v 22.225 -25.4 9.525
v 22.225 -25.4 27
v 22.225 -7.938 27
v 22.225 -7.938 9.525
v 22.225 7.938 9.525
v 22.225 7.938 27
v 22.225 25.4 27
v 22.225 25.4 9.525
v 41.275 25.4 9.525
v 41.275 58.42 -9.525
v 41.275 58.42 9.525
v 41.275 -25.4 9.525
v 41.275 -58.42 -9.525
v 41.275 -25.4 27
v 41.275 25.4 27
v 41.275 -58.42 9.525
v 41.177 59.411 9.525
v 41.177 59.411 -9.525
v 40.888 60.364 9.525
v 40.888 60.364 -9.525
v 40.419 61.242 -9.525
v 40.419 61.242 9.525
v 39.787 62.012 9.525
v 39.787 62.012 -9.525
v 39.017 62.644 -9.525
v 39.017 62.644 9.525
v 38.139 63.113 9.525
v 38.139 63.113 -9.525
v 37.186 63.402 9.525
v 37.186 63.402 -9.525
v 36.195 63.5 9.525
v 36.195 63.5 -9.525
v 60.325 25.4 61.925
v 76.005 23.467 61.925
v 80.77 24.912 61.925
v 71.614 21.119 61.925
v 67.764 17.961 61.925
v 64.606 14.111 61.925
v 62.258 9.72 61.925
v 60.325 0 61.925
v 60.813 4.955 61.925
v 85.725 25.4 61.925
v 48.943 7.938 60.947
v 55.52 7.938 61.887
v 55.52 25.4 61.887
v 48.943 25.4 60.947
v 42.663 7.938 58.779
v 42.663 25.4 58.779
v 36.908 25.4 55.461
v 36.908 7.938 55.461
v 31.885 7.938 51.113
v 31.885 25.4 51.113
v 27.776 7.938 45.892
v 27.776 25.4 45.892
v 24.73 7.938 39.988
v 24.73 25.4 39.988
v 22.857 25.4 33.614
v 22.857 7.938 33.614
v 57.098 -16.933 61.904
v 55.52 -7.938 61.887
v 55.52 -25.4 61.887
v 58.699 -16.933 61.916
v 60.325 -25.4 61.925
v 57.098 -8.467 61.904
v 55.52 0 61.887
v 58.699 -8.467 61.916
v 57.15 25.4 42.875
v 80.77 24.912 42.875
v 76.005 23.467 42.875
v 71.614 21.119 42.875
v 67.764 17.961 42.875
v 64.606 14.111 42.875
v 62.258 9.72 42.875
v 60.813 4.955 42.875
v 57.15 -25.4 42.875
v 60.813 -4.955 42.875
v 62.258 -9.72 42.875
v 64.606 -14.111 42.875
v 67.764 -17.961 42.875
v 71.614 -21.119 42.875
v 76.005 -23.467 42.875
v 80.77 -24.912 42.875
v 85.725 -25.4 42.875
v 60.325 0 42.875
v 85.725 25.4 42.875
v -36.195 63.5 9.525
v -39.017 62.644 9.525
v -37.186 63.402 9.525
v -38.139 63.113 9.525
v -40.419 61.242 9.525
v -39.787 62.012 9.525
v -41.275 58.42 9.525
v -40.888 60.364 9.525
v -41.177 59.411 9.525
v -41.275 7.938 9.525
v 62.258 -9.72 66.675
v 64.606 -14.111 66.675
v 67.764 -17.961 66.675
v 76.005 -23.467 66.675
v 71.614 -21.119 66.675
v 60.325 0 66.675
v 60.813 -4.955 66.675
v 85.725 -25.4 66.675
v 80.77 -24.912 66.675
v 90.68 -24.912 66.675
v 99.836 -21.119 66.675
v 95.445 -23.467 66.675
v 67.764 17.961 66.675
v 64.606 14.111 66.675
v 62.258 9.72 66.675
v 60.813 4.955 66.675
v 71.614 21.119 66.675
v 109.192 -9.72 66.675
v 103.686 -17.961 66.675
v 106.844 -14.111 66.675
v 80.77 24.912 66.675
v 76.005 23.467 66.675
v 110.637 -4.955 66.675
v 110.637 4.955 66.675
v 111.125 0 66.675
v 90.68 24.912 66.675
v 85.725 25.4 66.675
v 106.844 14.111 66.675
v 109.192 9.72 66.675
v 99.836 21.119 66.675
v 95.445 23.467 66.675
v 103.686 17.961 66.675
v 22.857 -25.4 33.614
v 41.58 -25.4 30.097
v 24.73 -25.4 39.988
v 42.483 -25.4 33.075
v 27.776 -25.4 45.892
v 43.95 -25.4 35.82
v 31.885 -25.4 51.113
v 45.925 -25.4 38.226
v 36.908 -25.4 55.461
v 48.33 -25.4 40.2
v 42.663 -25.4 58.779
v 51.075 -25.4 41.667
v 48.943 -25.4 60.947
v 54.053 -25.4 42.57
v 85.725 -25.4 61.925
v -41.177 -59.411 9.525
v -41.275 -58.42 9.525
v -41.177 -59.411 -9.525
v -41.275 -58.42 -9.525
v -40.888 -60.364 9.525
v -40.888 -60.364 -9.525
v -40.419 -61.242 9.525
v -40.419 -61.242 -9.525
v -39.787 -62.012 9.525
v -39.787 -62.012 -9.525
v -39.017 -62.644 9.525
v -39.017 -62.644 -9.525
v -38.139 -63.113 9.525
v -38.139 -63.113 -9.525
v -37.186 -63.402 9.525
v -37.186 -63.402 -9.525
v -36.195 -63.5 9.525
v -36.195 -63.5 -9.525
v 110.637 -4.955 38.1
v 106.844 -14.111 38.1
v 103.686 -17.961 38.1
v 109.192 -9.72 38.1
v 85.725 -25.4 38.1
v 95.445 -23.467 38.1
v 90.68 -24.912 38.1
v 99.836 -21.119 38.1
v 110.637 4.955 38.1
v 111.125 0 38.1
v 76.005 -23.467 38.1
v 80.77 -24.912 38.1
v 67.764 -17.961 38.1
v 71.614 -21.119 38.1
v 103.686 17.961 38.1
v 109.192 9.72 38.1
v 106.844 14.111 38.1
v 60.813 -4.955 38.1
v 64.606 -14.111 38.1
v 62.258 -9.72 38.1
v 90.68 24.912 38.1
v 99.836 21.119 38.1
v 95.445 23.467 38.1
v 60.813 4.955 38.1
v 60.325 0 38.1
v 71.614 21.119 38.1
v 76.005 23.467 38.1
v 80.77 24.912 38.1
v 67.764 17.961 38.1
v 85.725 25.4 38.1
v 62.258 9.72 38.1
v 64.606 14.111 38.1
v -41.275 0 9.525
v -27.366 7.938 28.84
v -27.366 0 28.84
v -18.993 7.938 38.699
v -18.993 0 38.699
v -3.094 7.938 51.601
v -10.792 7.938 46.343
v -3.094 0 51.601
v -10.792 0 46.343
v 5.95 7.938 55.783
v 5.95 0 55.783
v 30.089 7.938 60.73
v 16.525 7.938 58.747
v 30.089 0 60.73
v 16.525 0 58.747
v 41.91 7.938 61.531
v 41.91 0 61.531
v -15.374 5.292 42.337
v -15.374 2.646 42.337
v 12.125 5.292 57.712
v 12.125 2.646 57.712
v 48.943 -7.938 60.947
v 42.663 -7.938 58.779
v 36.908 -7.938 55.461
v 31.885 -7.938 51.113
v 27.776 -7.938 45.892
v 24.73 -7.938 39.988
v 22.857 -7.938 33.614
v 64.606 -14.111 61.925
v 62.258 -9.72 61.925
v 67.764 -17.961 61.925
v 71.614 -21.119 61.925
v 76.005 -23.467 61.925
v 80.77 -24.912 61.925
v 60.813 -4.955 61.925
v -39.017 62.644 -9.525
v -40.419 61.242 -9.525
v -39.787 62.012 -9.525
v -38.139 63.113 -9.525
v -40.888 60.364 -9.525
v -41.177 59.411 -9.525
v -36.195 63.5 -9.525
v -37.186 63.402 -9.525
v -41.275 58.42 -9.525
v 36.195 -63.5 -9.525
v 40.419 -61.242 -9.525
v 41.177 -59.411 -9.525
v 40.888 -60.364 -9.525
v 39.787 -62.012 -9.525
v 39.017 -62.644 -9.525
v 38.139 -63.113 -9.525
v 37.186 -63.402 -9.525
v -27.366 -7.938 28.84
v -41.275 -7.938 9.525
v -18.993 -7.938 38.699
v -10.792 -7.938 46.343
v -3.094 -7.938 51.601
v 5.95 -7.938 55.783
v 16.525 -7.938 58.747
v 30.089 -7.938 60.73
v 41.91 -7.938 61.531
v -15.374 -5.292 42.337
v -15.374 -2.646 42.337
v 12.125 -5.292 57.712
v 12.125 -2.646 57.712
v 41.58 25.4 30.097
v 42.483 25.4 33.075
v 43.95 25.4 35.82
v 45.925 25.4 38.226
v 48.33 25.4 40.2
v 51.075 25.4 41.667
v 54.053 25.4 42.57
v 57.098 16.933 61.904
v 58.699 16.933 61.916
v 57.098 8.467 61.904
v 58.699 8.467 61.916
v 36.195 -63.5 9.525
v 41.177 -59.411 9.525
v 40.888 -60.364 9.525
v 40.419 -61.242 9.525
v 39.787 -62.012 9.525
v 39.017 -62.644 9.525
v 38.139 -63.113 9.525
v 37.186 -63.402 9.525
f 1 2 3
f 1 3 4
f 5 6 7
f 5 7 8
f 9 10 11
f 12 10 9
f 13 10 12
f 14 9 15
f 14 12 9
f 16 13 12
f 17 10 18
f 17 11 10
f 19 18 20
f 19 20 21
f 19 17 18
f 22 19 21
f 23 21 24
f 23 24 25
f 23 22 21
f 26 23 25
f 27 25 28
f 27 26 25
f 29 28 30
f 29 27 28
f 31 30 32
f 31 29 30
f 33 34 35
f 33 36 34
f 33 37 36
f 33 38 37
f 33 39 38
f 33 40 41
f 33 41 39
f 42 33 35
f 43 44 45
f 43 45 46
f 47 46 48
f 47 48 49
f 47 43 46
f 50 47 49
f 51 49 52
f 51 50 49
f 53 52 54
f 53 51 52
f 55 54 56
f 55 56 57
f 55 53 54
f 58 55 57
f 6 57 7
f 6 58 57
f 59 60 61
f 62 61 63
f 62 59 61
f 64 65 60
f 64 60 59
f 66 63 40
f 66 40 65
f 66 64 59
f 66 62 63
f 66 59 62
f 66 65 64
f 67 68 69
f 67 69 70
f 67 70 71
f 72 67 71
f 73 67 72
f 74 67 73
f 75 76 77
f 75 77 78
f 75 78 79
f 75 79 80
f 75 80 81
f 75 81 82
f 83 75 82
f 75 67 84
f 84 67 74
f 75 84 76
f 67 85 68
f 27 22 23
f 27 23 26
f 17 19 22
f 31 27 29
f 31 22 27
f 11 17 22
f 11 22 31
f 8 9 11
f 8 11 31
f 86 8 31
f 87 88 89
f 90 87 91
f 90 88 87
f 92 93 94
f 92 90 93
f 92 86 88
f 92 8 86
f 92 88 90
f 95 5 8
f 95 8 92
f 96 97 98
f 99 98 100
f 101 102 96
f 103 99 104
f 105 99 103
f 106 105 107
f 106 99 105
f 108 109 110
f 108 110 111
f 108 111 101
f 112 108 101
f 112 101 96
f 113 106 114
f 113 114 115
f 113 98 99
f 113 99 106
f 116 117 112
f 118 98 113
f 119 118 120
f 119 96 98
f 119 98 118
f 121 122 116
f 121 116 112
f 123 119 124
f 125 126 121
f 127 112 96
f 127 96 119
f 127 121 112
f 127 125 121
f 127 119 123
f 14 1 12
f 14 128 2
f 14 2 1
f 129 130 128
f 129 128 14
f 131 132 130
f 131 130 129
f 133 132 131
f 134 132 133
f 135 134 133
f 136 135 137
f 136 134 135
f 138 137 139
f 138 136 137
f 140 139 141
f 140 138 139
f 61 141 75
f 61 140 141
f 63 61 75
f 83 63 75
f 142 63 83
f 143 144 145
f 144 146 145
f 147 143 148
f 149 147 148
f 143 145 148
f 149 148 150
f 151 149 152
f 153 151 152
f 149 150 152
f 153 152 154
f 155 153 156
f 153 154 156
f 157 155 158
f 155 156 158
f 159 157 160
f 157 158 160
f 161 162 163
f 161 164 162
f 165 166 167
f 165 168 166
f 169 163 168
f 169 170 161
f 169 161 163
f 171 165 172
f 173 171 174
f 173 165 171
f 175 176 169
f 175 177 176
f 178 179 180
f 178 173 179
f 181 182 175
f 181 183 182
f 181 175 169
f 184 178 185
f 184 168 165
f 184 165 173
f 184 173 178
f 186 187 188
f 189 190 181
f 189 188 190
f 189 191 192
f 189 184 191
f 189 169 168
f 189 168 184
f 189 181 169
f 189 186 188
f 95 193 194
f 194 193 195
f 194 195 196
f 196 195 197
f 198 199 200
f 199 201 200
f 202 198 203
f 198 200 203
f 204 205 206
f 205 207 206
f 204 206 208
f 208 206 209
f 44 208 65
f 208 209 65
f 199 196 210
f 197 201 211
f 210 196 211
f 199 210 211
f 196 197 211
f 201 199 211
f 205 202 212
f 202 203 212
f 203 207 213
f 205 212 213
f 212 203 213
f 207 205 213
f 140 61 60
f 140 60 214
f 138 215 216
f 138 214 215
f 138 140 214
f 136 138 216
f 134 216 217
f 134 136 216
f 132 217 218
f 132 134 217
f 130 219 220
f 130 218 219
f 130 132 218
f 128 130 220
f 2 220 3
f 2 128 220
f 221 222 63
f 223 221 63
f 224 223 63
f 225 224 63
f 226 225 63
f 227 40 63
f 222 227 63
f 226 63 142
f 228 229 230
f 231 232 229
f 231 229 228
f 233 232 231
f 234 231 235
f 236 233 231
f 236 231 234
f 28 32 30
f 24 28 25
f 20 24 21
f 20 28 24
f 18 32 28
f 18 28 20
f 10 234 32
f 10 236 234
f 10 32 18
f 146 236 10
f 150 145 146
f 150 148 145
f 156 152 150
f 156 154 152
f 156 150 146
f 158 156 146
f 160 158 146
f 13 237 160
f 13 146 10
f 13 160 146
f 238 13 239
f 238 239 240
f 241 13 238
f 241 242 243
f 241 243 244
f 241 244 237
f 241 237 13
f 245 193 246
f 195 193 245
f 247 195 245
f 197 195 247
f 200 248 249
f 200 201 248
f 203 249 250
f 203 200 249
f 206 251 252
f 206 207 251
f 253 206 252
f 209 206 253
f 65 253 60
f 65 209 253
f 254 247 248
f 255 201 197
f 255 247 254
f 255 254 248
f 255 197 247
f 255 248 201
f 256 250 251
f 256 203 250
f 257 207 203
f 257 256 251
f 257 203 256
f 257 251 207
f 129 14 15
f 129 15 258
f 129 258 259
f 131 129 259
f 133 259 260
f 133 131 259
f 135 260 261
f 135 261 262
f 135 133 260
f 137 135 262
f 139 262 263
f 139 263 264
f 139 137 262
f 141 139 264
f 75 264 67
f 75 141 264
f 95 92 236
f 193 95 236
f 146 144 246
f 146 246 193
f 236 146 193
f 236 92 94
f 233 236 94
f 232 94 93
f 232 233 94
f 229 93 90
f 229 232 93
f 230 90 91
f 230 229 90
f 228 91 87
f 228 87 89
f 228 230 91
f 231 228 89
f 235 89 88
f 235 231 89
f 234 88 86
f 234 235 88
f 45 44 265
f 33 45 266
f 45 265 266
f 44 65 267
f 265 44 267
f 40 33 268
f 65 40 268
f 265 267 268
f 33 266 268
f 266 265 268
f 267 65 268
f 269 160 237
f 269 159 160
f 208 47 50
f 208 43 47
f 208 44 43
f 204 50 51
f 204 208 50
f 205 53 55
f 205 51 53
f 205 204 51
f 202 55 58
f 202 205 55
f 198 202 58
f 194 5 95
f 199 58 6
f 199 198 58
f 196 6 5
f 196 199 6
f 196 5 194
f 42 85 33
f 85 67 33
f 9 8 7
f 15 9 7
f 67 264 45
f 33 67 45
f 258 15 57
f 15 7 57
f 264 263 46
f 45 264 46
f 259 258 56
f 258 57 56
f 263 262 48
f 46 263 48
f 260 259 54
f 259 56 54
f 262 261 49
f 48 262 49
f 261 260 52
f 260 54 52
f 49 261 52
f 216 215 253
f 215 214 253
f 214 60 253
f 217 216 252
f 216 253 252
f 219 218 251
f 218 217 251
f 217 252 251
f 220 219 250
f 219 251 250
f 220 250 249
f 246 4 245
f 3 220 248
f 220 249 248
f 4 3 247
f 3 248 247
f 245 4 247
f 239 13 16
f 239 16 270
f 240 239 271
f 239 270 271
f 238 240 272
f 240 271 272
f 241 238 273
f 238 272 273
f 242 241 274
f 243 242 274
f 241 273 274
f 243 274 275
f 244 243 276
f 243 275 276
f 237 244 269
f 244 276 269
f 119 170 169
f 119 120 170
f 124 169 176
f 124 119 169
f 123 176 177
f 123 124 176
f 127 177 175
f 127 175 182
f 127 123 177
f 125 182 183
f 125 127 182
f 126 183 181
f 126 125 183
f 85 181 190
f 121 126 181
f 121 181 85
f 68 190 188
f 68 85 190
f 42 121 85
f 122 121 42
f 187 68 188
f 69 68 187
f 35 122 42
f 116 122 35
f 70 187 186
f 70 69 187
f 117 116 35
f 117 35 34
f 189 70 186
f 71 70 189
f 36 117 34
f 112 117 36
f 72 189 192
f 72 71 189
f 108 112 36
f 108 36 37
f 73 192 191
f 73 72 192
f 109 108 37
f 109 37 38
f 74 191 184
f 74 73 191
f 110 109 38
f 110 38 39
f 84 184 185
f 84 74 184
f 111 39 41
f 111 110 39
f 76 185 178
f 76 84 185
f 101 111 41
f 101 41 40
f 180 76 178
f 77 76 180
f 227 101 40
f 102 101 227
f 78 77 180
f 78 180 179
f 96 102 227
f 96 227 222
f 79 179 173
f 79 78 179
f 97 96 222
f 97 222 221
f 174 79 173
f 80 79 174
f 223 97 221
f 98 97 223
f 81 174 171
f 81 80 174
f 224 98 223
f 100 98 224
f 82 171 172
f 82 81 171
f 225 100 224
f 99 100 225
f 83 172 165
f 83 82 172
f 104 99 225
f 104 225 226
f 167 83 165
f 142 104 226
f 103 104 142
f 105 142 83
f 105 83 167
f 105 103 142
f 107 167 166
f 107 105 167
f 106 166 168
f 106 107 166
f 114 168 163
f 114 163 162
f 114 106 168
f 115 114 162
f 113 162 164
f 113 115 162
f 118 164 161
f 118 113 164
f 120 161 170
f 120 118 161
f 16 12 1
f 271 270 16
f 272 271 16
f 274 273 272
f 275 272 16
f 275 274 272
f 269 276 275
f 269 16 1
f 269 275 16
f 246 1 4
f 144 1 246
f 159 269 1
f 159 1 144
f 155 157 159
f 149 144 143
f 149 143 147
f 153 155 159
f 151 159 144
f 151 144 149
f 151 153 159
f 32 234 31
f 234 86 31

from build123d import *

# Parameters (mm, degrees)
F1_DEPTH = 63.5
F2_DEPTH = 25.4
F3_DEPTH = 7.9375
F5_R     = 5.08
F6_DEPTH = 25.4


with BuildPart() as f1:
    # F0 (on Front) → F1 (new body, symmetric)
    with BuildSketch(Plane.XZ):
        Polygon((-41.275, -9.525), (41.275, -9.525), (41.275, 9.525), (22.225, 9.525), (-41.275, 9.525), align=None)
    extrude(amount=F1_DEPTH, both=True)

    # F0 (on Front) → F2 (join, symmetric)
    with BuildSketch(Plane.XZ):
        with BuildLine():
            Line((22.225, 9.525), (41.275, 9.525))
            Line((41.275, 9.525), (41.275, 27.0002))
            ThreePointArc((41.275, 27.0002), (45.9246798487, 38.2255201513), (57.15, 42.8752))
            Line((57.15, 42.8752), (60.325, 42.8752))
            Line((60.325, 42.8752), (60.325, 61.9252))
            add(Edge.make_bspline(
                [(55.5200098819, 61.8871425031), (57.0859299245, 61.9054209742), (58.687127075, 61.9179033933), (60.325, 61.9252)],
                knots=[111.2130490849, 111.2130490849, 111.2130490849, 111.2130490849, 114.3168446032, 114.3168446032, 114.3168446032, 114.3168446032], degree=3))
            ThreePointArc((55.5200098819, 61.8871425031), (31.8845786709, 51.1127301464), (22.225, 27.0002))
            Line((22.225, 27.0002), (22.225, 9.525))
        make_face()
    extrude(amount=F2_DEPTH, both=True)

    # F0 (on Front) → F3 (join, symmetric)
    with BuildSketch(Plane.XZ):
        with BuildLine():
            add(Edge.make_bspline(
                [(-41.275, 9.525), (-11.4062497234, 53.1358095427), (-0.5889513978, 61.2322009997), (55.5200098819, 61.8871425031)],
                knots=[0, 0, 0, 0, 111.2130490849, 111.2130490849, 111.2130490849, 111.2130490849], degree=3))
            Line((-41.275, 9.525), (22.225, 9.525))
            Line((22.225, 9.525), (22.225, 27.0002))
            ThreePointArc((22.225, 27.0002), (31.8845786709, 51.1127301464), (55.5200098819, 61.8871425031))
        make_face()
    extrude(amount=F3_DEPTH, both=True)

    # F0 (on Front) → F4 (revolve)
    with BuildSketch(Plane.XZ):
        Polygon((85.725, 66.675), (85.725, 61.9252), (85.725, 42.8752), (85.725, 38.1), (111.125, 38.1), (111.125, 66.675), align=None)
    revolve(axis=Axis((85.725, 0, 52.3875), (0, 0, 1)))

    # F5
    f5_edges = [f1.edges().sort_by_distance(p)[0] for p in [
        (-41.275, -63.5, 0),
        (41.275, -63.5, 0),
        (-41.275, 63.5, 0),
        (41.275, 63.5, 0),
    ]]
    fillet(f5_edges, radius=F5_R)

    # F6 (add): faces of the model
    f6_faces = [f1.faces().sort_by_distance(p)[0] for p in [
        (60.325, 12.7, 52.4002),
        (60.325, -12.7, 52.4002),
    ]]
    extrude(f6_faces, amount=F6_DEPTH)


solid = f1.part
